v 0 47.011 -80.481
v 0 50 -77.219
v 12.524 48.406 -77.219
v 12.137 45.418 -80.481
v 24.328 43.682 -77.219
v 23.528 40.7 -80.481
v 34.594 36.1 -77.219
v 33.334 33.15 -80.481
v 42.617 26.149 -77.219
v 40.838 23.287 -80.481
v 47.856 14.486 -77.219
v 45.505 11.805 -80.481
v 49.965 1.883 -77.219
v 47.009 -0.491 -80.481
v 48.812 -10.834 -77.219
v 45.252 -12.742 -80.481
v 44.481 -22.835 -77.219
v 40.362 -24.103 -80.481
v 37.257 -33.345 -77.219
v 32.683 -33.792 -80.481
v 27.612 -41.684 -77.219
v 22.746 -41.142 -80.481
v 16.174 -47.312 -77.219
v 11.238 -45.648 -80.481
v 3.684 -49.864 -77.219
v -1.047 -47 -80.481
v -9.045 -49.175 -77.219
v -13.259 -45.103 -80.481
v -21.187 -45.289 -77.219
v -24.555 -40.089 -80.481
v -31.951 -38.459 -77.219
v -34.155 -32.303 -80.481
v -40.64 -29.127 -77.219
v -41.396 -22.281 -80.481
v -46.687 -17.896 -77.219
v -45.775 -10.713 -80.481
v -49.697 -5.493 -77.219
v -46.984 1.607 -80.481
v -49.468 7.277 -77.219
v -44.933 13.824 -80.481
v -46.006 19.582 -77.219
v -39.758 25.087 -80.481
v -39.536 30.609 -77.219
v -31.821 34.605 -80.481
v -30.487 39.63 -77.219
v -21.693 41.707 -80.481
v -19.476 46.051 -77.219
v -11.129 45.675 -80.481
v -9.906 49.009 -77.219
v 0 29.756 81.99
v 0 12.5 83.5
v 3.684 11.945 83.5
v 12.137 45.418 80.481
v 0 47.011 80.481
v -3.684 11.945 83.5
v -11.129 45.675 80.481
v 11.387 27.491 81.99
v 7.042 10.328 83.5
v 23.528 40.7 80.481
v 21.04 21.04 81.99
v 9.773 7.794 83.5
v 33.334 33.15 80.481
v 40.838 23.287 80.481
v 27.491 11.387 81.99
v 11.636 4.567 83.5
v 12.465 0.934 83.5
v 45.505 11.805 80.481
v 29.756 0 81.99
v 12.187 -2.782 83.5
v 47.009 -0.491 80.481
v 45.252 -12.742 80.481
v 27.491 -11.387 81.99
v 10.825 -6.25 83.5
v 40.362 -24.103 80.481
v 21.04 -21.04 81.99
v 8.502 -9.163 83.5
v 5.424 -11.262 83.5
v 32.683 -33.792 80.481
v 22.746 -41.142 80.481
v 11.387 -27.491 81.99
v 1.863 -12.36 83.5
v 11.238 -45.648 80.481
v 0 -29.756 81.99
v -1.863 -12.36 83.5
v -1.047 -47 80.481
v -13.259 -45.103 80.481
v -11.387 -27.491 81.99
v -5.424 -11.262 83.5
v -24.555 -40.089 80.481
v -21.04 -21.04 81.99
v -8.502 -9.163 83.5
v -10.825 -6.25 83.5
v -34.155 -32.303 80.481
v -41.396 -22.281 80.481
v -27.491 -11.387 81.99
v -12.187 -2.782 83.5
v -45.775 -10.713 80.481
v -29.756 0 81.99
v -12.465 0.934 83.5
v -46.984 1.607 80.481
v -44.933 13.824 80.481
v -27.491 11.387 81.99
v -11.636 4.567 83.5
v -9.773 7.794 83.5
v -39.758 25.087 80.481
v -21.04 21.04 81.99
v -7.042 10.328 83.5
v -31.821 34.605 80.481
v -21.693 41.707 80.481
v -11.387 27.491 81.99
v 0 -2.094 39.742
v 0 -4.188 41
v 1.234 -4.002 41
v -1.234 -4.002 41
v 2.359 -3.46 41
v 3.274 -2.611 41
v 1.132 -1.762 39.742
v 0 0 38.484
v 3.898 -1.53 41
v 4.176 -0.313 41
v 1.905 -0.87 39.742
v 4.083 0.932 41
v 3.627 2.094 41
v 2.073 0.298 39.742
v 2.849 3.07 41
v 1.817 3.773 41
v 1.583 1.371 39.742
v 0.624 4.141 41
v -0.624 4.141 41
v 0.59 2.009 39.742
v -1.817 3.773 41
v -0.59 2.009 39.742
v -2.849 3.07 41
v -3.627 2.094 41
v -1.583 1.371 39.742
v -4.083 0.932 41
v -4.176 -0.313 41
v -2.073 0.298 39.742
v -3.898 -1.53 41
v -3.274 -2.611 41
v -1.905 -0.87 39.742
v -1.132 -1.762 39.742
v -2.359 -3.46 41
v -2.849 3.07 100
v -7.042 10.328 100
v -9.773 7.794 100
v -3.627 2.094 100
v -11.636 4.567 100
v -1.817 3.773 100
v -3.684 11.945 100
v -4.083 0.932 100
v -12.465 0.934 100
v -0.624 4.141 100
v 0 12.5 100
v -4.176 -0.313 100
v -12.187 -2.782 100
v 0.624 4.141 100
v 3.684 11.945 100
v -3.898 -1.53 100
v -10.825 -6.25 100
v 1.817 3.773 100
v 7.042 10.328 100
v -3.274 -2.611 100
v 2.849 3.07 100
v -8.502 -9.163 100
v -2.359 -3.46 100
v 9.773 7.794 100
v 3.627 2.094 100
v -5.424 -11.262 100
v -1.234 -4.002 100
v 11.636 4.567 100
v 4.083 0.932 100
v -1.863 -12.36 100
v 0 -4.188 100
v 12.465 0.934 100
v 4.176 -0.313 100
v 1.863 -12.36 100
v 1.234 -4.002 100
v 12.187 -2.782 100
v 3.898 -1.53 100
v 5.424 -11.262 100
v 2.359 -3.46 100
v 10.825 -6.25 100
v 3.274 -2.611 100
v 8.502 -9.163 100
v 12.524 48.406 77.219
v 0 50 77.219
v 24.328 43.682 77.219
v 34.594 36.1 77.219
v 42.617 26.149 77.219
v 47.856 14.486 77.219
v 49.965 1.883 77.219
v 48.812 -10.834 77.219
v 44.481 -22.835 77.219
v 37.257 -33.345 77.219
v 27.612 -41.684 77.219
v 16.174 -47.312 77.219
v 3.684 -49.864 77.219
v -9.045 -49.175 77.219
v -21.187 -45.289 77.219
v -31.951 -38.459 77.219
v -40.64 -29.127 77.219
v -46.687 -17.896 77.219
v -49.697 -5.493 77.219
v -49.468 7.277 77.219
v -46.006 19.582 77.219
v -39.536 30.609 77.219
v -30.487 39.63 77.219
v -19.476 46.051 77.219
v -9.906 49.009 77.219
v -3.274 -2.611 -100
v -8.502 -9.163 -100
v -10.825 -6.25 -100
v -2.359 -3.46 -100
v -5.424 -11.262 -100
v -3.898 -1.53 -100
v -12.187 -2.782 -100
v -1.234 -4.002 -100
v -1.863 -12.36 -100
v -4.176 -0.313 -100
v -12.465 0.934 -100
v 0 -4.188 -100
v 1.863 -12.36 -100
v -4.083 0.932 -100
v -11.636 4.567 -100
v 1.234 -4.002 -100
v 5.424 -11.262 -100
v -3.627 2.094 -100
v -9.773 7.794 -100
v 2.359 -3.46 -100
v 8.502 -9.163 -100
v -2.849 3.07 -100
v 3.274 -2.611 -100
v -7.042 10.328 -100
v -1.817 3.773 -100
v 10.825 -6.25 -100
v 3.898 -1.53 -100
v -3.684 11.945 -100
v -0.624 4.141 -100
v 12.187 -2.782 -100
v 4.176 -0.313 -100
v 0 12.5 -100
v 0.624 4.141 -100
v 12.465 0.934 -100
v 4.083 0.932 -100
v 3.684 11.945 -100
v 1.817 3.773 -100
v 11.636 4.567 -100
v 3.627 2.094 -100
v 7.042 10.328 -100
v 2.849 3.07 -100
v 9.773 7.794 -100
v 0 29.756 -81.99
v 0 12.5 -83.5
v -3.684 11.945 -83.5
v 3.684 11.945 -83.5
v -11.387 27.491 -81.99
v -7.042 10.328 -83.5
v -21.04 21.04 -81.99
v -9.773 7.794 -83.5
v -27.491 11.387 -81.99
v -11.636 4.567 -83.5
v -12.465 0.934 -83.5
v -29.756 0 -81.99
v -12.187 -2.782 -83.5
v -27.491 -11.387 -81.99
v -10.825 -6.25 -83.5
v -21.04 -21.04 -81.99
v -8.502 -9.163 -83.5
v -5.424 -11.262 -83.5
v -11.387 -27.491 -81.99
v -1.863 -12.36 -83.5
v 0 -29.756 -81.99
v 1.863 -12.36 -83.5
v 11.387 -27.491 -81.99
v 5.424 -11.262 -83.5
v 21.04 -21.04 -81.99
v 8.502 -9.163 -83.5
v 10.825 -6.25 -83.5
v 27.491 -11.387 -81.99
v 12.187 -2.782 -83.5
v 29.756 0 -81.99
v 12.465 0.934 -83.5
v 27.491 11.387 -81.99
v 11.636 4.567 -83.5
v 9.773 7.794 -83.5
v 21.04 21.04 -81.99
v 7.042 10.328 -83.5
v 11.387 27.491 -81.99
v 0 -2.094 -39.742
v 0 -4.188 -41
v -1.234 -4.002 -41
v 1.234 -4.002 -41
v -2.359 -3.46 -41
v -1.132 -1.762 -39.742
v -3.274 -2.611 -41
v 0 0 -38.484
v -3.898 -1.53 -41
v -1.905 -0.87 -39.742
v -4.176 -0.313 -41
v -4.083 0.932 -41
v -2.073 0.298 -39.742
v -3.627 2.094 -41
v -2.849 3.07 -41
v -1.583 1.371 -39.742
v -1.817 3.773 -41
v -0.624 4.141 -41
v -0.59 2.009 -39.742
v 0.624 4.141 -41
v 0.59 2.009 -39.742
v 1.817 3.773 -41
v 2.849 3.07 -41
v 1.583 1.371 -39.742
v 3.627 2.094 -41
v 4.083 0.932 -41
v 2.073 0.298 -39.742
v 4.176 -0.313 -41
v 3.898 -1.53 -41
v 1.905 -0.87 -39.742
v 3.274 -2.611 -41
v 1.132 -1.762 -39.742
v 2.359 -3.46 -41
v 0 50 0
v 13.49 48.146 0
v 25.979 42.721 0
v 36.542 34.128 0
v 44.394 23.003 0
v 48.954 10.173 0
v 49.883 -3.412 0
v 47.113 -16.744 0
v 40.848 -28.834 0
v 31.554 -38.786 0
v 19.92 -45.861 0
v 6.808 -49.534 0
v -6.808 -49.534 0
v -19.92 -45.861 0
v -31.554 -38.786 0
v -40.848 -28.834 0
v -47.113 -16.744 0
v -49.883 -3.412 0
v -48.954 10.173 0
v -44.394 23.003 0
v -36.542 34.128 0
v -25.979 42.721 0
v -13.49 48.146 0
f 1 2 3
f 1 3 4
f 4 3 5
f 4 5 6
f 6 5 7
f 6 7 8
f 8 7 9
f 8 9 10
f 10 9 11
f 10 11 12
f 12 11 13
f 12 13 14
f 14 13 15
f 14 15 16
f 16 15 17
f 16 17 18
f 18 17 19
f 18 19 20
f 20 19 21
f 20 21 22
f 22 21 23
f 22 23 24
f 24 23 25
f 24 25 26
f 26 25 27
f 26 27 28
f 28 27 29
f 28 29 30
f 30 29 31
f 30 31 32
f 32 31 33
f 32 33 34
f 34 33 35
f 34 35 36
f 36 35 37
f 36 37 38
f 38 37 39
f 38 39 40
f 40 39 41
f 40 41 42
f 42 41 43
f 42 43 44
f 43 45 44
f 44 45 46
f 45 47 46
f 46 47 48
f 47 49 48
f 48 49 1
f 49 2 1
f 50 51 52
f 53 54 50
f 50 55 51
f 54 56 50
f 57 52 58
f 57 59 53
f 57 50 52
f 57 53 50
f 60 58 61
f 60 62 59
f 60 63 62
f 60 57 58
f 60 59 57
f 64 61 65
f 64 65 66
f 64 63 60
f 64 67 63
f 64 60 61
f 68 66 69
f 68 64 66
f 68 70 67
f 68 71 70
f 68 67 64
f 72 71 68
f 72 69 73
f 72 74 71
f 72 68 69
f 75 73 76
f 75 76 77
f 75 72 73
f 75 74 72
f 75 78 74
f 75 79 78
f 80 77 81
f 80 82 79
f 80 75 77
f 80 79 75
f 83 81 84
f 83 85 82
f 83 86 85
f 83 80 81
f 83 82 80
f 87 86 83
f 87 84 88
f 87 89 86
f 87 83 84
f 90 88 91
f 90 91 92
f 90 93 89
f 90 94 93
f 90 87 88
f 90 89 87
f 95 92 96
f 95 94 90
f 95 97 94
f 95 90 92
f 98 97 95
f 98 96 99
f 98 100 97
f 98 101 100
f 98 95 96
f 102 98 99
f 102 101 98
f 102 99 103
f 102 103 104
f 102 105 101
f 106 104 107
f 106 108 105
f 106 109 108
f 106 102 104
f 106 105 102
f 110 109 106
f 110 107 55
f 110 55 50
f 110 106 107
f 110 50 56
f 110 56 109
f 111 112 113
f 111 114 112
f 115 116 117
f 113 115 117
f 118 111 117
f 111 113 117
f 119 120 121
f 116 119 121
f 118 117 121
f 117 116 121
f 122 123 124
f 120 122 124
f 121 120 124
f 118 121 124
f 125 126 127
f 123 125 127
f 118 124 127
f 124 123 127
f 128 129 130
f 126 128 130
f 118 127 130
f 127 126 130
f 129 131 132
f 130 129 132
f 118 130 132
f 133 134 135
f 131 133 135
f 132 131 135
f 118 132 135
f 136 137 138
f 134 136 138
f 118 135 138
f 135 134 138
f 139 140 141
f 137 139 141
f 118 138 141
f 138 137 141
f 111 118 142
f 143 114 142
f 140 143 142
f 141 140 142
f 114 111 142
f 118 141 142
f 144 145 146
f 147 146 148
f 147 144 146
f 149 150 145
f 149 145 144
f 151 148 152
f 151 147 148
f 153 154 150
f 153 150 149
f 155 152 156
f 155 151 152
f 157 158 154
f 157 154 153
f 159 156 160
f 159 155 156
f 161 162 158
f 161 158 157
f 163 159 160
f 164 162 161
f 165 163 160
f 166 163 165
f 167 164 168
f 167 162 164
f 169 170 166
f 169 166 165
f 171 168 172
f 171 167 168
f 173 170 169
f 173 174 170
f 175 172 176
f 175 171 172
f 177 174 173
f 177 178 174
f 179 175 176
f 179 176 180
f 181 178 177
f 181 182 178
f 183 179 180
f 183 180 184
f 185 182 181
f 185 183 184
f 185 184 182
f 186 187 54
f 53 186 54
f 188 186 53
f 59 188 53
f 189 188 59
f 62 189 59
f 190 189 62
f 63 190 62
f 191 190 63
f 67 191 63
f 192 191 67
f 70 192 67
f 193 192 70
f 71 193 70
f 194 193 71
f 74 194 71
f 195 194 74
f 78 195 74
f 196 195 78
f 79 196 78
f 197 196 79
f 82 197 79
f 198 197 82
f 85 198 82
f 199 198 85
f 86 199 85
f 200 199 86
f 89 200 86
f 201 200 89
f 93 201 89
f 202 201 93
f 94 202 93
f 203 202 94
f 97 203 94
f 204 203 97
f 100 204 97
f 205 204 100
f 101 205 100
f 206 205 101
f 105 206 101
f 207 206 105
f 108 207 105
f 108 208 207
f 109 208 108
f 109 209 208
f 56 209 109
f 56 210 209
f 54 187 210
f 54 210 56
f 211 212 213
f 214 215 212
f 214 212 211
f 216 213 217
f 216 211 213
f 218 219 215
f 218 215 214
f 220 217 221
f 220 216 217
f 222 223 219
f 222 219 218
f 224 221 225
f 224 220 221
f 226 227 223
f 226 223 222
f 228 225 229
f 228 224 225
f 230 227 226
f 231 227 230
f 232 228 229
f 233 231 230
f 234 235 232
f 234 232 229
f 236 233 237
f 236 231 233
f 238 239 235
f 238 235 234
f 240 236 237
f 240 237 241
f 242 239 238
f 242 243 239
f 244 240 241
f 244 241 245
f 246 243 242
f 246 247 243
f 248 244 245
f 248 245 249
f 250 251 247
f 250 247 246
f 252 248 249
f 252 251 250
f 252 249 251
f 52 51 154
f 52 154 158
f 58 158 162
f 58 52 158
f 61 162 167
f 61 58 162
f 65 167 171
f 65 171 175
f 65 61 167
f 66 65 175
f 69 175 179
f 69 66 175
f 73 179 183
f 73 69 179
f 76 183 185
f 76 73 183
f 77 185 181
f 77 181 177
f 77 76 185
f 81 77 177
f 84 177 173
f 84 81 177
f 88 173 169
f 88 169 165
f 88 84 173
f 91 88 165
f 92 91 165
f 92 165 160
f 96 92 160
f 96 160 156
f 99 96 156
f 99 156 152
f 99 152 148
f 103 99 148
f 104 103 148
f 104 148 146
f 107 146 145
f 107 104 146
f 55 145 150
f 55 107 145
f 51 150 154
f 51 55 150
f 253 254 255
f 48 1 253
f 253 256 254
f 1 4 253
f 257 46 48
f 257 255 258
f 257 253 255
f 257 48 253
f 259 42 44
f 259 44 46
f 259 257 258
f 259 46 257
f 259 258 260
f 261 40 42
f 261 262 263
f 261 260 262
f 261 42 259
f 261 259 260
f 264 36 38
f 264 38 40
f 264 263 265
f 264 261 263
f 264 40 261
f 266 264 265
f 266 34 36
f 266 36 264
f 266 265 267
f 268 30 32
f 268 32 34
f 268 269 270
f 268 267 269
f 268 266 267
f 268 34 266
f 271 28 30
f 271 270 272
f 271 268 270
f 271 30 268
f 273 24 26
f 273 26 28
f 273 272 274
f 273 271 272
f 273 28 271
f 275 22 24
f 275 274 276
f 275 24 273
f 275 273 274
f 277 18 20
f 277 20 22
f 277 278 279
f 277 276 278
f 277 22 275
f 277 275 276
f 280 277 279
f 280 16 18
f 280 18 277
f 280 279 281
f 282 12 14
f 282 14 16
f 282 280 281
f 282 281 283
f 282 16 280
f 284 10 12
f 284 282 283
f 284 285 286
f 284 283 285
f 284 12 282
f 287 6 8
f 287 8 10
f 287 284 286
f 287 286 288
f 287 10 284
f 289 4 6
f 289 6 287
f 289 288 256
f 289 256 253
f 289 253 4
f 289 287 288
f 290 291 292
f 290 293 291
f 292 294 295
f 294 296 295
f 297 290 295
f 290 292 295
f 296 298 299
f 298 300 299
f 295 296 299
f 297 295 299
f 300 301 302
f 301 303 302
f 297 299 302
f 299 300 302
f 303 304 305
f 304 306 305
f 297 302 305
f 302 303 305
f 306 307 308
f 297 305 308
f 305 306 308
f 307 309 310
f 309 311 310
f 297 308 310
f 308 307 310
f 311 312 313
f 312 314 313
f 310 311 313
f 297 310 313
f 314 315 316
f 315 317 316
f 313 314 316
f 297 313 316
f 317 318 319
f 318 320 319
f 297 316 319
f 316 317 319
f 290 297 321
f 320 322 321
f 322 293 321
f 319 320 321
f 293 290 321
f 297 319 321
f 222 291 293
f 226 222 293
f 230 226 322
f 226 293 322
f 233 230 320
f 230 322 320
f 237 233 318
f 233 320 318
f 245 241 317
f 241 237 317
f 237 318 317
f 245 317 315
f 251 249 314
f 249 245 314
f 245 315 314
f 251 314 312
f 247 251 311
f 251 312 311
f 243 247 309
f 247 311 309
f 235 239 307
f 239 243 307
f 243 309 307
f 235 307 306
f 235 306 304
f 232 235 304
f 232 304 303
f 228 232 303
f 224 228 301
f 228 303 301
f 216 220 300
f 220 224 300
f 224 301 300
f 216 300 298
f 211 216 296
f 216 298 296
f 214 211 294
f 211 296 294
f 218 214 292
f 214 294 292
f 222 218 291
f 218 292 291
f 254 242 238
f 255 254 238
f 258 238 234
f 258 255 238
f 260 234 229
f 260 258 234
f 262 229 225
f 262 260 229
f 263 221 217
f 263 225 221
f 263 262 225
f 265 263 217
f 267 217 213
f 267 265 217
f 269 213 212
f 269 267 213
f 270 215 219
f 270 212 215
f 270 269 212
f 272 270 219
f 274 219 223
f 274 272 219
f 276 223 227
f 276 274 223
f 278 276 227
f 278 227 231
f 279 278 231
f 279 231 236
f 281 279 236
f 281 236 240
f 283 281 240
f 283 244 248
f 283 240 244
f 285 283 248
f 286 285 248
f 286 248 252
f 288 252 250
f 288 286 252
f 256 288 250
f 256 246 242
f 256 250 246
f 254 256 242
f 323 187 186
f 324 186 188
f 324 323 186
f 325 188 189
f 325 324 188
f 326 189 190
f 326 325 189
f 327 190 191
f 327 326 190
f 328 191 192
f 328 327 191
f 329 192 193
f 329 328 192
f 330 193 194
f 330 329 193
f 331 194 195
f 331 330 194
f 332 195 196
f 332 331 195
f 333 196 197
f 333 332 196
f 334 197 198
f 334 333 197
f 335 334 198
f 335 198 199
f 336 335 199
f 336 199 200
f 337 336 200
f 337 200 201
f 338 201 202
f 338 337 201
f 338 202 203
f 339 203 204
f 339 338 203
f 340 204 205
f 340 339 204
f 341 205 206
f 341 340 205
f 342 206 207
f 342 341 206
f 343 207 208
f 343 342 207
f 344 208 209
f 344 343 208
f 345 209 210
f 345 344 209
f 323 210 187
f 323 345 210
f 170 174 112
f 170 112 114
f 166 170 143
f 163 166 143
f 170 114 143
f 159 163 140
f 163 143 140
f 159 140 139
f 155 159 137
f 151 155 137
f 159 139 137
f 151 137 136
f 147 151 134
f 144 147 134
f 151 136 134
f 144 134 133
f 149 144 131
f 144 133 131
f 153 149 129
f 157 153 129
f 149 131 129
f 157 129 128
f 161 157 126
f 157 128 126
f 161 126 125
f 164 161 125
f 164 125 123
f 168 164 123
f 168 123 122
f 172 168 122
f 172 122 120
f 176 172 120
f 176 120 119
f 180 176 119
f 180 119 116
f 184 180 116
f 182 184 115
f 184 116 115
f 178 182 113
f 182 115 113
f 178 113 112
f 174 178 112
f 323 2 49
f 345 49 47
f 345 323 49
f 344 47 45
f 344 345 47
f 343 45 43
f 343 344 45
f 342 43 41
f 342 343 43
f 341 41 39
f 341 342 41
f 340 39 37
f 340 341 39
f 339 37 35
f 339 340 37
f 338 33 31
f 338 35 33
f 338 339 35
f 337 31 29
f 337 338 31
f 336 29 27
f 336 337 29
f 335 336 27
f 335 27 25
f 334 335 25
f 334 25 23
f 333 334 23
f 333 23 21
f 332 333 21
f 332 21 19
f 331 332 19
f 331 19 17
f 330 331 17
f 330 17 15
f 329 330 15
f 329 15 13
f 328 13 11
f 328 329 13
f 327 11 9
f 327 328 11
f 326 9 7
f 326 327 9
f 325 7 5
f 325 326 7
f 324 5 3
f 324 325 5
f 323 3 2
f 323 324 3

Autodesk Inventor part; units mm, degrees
ref_plane "YZ Plane" through (0, 0, 0) normal (1, 0, 0) x (0, 1, 0)
ref_plane "XZ Plane" through (0, 0, 0) normal (0, 1, 0) x (-1, 0, 0)
ref_plane "XY Plane" through (0, 0, 0) normal (0, 0, 1) x (1, 0, 0)
sketch "草圖1" plane through (0, 0, 0) normal (1, 0, 0) x (0, 1, 0)
  line L0 (-26.8, 0) -> (62.8, 0) projected
  line L1 (0, -120) -> (0, 20) projected
  line L2 (-14, -100) -> (14, -100)
  line L3 (0, -100) -> (12.5, -100)
  line L4 (12.5, -100) -> (12.5, -83.5)
  line L5 (12.5, -83.5) -> (0, -83.5)
  line L6 (0, -83.5) -> (0, -100)
  line L7 (12.5, -83.5) -> (50, -80.2192)
  line L8 (12.5, -83.5) -> (37.1972, -83.5) construction
  line L9 (50, -80.2192) -> (50, 0)
  line L10 (50, 0) -> (0, 0)
  line L11 (0, 0) -> (0, -83.5)
  dimension "d0" = 100
  dimension "d1" = 12.5
  dimension "d2" = 16.5
  dimension "d3" = 0
  dimension "d4" = 5
  dimension "d5" = 50
revolve "迴轉1" add sketch "草圖1" angle 360 about axis through (0, 0, 0) along (0, 0, -1)
mirror "鏡射1" about plane through (0, 50, 0) normal (0, 0, 1) of "迴轉1"
chamfer "倒角1" distance 3 angle 45 2 edges at (0, -50, 80.2192) (0, -50, -80.2192)
hole "孔1" at (0, 0, 100) direction (0, 0, -1) diameter 8.376 depth 59 tip angle 118 thread size "M10x1.5" class "6H" standard "ISO Metric profile"
ref_plane "工作平面1" through (0, 0, 0) normal (0, 0, 1) x (1, 0, 0)
ref_plane "工作平面2" through (0, 0, 0) normal (0, 0, -1) x (-1, 0, 0)
mirror "鏡射2" about plane through (0, 0, 0) normal (0, 0, 1) of "孔1"
properties part number "exercise3-11"
